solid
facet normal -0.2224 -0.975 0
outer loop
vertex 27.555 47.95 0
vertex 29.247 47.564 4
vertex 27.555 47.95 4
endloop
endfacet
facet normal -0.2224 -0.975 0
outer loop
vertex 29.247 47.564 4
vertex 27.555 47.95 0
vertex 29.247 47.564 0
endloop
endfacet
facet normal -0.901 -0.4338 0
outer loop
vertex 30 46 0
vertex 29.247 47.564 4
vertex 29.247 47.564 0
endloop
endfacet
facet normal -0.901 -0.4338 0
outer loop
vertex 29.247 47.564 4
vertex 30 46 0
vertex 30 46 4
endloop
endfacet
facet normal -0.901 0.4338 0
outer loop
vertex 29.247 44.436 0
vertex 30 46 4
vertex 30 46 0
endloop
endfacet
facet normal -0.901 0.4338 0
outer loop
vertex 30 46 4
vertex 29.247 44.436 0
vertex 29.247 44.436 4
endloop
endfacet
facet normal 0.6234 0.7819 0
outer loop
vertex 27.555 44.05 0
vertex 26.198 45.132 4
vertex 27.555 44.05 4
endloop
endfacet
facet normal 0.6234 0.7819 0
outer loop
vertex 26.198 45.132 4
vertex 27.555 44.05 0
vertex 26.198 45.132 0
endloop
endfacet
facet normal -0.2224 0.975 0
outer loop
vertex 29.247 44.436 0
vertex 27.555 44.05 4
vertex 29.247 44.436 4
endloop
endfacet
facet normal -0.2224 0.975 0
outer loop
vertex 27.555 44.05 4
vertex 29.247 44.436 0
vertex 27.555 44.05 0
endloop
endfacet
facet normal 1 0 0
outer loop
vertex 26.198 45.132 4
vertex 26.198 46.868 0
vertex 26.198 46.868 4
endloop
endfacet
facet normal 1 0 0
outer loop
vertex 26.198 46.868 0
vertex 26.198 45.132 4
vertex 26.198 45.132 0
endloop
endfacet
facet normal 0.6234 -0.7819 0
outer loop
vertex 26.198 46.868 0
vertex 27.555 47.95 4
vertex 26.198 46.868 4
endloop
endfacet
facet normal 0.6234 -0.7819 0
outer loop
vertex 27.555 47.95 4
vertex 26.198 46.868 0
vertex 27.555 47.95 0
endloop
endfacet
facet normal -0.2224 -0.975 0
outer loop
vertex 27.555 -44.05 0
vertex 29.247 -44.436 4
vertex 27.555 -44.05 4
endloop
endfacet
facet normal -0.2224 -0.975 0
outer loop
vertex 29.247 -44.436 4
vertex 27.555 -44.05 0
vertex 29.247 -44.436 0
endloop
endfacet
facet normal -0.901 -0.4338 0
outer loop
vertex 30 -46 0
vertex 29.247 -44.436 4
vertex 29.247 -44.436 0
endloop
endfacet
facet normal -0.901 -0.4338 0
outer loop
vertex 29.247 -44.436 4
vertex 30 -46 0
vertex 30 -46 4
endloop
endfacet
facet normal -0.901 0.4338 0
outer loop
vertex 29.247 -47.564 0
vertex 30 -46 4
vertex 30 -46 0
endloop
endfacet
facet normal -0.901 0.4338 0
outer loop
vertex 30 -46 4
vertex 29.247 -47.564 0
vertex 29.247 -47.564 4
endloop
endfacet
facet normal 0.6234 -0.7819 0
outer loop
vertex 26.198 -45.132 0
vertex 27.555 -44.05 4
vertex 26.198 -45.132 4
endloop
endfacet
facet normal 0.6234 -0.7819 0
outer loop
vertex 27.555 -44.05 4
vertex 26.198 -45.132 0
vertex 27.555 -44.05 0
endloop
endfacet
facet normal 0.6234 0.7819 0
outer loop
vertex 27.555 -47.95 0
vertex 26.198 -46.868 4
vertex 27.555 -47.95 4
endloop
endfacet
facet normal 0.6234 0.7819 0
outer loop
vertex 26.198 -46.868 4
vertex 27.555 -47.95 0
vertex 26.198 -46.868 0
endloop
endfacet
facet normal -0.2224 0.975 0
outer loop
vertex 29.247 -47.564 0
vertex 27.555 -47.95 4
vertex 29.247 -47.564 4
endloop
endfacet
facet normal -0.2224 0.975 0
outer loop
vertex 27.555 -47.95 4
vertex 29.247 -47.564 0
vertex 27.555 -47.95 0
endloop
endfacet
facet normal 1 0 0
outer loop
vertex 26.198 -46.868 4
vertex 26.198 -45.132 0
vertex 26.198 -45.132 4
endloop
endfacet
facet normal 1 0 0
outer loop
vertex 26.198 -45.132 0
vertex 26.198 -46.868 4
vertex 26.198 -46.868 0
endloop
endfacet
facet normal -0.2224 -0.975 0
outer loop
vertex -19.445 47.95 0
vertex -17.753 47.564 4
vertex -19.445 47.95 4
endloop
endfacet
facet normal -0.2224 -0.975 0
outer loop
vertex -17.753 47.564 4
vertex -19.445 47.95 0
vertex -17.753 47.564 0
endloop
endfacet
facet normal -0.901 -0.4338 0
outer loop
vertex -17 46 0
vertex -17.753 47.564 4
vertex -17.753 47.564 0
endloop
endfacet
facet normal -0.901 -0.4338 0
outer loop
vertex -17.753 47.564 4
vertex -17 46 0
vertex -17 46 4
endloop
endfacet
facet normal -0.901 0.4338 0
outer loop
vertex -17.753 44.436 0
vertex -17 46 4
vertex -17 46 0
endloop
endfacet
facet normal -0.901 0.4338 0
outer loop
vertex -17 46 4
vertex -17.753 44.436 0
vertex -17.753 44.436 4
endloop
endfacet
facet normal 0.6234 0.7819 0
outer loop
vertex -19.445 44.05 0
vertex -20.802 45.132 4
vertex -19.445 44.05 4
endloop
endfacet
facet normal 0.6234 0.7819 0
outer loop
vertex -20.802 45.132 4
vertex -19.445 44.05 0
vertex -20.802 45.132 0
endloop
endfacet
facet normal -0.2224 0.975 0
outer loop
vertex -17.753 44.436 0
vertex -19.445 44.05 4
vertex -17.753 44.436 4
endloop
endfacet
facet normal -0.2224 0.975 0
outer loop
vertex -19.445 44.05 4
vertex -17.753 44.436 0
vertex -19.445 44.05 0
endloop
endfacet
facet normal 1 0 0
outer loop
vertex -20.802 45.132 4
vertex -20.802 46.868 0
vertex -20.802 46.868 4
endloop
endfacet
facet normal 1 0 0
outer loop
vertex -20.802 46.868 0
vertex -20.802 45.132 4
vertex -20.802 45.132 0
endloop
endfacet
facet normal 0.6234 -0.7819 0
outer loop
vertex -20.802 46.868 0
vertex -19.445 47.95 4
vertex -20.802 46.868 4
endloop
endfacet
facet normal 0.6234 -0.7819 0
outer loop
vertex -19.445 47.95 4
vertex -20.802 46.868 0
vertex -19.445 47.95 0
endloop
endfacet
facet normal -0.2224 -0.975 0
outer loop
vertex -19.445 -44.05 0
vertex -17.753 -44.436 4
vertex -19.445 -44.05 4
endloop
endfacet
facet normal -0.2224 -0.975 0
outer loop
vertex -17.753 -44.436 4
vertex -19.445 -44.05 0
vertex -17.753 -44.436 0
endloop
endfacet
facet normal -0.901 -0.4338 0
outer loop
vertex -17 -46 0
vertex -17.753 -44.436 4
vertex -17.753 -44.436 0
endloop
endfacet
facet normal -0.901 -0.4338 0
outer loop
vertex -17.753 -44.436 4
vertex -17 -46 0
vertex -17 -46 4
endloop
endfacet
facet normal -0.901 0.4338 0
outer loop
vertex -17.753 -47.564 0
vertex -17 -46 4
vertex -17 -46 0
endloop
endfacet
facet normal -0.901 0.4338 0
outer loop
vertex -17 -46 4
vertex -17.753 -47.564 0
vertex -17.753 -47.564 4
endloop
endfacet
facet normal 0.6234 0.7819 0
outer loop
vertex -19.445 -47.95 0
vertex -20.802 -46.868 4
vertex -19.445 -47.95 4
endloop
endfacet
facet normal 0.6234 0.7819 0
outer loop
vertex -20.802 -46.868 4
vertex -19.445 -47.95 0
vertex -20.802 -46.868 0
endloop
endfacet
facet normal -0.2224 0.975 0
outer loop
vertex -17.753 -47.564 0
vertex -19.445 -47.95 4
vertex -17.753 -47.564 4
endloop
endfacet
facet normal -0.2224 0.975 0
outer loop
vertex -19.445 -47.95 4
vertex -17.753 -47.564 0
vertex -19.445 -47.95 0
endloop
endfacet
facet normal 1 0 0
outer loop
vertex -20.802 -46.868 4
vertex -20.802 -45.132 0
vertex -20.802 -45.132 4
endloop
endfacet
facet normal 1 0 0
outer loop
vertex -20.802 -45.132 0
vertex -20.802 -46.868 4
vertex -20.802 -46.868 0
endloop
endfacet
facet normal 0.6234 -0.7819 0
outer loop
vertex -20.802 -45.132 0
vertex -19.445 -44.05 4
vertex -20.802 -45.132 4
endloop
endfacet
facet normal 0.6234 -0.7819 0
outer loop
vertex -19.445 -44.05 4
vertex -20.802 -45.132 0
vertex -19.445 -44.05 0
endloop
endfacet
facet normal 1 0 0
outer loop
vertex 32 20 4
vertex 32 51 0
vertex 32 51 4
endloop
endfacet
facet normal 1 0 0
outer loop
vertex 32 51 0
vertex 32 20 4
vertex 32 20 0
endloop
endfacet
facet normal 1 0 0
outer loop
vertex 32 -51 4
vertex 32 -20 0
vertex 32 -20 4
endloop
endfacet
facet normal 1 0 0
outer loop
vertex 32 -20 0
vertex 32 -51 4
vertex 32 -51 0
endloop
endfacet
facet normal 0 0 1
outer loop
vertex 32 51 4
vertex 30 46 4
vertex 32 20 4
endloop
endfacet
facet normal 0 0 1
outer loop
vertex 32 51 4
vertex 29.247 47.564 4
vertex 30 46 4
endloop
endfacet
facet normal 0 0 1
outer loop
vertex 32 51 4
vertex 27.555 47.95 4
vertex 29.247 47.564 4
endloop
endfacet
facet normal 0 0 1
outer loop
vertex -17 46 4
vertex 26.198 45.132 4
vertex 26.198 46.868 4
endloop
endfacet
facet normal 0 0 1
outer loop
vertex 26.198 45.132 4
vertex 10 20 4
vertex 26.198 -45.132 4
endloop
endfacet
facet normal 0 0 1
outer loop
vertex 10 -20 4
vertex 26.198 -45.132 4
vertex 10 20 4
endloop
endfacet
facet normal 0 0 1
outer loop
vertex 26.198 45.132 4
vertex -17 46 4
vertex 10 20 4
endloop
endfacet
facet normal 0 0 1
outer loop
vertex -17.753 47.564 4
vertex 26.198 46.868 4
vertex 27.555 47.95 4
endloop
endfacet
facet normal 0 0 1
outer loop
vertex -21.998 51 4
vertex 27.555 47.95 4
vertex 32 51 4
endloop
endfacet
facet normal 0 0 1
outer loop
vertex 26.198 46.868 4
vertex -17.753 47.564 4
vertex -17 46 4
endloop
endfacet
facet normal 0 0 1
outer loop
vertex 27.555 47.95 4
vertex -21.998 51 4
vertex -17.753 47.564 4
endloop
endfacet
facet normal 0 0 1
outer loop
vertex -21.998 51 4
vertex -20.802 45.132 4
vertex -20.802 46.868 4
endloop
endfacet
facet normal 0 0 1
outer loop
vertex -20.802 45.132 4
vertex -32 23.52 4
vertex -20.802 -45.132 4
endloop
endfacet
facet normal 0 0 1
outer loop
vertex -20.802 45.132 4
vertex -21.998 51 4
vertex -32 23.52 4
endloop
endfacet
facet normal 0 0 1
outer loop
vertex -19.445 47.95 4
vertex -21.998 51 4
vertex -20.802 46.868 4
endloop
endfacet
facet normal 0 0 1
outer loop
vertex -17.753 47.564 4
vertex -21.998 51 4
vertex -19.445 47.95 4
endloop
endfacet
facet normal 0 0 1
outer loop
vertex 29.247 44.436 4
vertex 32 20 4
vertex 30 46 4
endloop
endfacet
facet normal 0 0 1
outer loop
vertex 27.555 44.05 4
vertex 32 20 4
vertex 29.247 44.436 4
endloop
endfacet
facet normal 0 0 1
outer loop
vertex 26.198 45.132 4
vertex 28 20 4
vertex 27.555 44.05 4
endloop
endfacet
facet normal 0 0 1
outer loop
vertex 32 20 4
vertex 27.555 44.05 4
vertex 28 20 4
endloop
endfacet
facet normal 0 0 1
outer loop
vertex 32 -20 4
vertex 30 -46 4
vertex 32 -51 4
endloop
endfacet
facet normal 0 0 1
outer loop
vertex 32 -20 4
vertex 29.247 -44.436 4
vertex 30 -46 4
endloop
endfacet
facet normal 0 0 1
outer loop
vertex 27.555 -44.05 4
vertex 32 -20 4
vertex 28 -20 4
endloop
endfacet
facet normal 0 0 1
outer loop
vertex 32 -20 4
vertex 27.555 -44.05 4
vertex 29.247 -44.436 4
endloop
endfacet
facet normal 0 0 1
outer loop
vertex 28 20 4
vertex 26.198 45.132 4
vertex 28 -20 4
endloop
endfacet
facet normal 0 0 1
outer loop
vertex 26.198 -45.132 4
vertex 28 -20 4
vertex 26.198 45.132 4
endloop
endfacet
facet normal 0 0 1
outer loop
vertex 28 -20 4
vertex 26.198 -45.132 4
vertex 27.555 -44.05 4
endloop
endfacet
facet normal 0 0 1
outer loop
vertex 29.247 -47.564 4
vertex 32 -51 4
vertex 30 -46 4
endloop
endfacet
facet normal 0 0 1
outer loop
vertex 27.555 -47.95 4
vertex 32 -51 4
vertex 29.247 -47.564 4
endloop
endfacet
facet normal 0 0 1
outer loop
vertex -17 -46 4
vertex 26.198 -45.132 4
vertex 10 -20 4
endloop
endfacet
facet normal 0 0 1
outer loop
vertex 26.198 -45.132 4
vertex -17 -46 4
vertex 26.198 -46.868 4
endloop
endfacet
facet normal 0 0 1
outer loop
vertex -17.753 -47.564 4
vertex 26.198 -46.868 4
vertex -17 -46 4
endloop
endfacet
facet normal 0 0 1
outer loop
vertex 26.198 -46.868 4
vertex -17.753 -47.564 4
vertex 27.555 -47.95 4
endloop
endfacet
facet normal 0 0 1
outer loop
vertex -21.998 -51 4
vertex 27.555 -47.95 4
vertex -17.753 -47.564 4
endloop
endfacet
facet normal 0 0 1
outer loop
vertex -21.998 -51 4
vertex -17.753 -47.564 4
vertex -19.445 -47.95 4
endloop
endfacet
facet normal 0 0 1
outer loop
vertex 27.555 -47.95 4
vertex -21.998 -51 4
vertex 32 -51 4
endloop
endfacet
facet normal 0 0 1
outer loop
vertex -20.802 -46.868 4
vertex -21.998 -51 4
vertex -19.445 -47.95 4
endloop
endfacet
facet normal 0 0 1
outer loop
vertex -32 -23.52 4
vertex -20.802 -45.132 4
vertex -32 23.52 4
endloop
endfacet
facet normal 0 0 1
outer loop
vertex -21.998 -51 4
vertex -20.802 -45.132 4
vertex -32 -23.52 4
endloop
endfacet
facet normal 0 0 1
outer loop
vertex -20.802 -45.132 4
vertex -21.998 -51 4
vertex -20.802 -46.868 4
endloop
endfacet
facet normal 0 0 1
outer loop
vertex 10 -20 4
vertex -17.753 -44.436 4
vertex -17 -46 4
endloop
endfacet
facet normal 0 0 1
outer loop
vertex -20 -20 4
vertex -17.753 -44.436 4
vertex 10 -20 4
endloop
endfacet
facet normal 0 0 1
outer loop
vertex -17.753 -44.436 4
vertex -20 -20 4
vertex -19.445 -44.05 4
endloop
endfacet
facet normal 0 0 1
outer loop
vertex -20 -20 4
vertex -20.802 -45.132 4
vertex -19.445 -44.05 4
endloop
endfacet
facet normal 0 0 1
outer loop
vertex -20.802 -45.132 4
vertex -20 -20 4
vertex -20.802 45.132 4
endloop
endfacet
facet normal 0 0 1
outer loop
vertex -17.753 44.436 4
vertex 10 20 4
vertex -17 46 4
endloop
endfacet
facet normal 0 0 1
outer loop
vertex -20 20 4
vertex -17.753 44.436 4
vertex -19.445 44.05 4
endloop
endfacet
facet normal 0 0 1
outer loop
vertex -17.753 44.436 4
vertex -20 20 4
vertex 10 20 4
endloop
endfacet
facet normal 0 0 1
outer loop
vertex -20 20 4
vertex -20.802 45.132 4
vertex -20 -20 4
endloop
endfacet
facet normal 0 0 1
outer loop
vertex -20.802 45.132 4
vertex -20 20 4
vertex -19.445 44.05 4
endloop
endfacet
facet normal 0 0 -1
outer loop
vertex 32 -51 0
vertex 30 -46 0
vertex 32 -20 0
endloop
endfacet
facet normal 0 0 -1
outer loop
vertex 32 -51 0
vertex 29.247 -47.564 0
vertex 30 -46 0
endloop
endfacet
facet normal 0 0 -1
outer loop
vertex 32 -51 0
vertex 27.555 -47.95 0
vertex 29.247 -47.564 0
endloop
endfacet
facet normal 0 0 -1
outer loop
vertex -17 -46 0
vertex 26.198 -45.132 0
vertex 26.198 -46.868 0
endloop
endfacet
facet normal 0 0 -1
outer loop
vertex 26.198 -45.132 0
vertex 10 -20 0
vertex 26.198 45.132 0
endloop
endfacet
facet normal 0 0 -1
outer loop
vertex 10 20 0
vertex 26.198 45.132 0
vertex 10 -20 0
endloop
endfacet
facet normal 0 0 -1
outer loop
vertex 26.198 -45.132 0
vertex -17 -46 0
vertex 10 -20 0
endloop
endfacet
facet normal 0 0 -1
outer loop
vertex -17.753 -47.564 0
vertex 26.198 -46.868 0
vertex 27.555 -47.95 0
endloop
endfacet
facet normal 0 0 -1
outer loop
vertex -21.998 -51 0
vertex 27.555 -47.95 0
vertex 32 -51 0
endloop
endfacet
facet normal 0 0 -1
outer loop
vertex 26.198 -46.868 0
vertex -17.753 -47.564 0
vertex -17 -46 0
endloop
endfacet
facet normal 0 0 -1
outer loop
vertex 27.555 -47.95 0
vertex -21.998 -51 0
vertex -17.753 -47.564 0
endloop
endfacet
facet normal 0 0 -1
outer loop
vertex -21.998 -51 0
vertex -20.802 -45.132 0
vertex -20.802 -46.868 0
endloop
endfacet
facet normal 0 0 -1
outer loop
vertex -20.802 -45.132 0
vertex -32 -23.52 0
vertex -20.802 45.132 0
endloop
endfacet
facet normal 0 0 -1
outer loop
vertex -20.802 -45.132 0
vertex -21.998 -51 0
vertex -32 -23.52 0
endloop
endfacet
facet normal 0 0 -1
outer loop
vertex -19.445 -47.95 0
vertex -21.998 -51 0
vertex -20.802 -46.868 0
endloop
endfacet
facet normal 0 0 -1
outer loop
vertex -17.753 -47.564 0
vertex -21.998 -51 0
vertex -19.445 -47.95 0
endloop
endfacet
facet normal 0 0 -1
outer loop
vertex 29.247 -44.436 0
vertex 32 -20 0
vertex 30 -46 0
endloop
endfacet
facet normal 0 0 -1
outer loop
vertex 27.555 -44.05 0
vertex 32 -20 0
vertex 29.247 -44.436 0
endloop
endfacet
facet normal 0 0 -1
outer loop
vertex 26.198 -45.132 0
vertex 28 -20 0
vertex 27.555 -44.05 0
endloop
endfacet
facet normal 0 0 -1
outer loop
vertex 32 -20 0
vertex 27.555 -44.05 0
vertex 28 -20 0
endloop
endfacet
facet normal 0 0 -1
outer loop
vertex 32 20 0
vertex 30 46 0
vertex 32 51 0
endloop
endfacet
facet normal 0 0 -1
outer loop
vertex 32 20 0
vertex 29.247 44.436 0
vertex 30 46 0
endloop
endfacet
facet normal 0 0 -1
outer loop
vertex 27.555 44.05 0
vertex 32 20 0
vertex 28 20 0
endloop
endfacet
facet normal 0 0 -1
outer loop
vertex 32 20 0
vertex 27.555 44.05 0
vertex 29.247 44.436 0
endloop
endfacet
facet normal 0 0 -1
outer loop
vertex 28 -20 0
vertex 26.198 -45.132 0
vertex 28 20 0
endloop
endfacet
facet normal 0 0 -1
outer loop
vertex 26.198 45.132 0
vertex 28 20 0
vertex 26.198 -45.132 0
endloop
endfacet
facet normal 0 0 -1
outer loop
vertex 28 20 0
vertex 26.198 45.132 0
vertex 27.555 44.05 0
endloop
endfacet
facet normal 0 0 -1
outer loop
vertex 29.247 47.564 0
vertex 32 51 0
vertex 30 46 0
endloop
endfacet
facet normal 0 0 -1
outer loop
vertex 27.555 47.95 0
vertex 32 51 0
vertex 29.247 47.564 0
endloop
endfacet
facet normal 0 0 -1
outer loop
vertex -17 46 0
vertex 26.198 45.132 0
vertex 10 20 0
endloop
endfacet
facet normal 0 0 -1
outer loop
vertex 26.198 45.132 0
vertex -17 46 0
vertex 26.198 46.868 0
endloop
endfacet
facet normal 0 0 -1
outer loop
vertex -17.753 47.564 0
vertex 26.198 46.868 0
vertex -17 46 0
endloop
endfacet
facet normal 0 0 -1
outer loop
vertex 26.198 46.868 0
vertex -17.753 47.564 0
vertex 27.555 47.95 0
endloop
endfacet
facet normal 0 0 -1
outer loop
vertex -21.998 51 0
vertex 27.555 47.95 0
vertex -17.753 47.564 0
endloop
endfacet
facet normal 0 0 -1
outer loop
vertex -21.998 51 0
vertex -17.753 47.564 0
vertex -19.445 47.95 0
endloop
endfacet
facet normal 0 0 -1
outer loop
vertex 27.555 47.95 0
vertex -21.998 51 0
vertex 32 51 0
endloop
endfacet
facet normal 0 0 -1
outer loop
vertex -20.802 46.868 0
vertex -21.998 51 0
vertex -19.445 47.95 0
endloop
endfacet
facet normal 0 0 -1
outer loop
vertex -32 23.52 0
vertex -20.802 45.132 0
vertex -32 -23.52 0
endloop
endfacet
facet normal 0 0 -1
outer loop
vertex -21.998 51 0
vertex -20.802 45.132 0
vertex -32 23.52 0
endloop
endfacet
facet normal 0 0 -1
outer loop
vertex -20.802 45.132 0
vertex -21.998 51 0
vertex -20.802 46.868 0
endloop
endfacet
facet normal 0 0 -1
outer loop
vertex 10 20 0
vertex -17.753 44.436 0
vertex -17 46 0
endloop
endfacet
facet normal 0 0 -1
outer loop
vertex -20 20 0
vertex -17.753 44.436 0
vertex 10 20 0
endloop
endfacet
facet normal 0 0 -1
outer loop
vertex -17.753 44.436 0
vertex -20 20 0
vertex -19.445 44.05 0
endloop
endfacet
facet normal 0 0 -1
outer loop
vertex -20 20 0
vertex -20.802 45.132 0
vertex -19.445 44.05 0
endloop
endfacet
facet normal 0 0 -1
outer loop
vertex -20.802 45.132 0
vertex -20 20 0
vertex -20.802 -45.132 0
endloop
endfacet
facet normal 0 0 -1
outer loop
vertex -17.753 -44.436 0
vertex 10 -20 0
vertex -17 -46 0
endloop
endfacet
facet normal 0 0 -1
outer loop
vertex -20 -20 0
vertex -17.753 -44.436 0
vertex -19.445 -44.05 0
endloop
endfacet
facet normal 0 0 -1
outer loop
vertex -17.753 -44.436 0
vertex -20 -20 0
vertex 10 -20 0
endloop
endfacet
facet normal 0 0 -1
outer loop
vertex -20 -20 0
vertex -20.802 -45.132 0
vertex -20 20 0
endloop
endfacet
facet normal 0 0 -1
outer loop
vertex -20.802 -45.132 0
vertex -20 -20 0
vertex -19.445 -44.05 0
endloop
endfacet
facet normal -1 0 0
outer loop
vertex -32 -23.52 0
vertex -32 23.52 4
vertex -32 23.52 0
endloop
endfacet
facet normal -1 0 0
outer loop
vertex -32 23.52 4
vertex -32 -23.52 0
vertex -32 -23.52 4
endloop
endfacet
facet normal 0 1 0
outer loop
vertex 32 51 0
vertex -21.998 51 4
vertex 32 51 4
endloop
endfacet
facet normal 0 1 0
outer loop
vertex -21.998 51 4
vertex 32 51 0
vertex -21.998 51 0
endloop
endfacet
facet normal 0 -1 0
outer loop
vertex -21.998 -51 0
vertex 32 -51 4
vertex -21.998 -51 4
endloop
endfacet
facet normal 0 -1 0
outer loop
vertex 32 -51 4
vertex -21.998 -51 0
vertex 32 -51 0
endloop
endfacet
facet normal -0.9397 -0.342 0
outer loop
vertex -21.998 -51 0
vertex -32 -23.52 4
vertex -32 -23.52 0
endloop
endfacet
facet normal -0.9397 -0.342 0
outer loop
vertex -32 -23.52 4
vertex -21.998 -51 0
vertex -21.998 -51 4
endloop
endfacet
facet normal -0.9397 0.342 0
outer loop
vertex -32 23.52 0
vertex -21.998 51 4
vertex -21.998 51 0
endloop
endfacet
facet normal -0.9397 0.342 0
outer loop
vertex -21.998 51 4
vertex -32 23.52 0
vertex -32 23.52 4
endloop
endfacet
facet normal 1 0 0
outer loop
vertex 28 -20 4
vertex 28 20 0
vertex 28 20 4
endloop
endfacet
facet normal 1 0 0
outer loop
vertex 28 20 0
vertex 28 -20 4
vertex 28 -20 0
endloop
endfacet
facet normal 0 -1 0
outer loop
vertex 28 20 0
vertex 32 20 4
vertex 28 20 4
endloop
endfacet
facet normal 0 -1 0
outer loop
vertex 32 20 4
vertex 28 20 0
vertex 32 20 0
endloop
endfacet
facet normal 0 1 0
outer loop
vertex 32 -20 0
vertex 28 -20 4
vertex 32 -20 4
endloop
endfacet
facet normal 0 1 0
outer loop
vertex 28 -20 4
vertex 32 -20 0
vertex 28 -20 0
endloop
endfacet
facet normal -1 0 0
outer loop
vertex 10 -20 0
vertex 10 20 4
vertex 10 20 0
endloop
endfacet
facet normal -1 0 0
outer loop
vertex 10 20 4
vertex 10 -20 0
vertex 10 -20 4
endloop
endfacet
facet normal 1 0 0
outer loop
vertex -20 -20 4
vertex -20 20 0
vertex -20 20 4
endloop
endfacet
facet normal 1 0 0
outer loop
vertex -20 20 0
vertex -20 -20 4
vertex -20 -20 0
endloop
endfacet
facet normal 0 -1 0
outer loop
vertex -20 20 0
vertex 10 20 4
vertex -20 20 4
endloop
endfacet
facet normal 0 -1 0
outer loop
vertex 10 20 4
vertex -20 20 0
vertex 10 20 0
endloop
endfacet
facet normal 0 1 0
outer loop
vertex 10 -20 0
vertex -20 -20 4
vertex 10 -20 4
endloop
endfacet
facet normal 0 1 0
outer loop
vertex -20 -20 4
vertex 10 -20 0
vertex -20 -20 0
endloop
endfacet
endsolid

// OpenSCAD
//Arduino Mega Board: 54x102x10


module pasantes(){

translate([28,46,-1])cylinder(r=2,h=70);
translate([28,-46,-1])cylinder(r=2,h=70);
translate([-19,46,-1])cylinder(r=2,h=70);
translate([-19,-46,-1])cylinder(r=2,h=70);
}

difference(){
	union(){
		translate([-64/2,-102/2,0])cube([64,102,4]);

	}

	translate([-29,-61,-4])rotate([0,0,20])cube([10,100,100]);
	mirror([0,1,0])translate([-29,-61,-4])rotate([0,0,20])cube([10,100,100]);

translate([28,-20,-1])cube([5,40,8]);

translate([-20,-20,-1])cube([30,40,8]);



	pasantes();





}/**/
